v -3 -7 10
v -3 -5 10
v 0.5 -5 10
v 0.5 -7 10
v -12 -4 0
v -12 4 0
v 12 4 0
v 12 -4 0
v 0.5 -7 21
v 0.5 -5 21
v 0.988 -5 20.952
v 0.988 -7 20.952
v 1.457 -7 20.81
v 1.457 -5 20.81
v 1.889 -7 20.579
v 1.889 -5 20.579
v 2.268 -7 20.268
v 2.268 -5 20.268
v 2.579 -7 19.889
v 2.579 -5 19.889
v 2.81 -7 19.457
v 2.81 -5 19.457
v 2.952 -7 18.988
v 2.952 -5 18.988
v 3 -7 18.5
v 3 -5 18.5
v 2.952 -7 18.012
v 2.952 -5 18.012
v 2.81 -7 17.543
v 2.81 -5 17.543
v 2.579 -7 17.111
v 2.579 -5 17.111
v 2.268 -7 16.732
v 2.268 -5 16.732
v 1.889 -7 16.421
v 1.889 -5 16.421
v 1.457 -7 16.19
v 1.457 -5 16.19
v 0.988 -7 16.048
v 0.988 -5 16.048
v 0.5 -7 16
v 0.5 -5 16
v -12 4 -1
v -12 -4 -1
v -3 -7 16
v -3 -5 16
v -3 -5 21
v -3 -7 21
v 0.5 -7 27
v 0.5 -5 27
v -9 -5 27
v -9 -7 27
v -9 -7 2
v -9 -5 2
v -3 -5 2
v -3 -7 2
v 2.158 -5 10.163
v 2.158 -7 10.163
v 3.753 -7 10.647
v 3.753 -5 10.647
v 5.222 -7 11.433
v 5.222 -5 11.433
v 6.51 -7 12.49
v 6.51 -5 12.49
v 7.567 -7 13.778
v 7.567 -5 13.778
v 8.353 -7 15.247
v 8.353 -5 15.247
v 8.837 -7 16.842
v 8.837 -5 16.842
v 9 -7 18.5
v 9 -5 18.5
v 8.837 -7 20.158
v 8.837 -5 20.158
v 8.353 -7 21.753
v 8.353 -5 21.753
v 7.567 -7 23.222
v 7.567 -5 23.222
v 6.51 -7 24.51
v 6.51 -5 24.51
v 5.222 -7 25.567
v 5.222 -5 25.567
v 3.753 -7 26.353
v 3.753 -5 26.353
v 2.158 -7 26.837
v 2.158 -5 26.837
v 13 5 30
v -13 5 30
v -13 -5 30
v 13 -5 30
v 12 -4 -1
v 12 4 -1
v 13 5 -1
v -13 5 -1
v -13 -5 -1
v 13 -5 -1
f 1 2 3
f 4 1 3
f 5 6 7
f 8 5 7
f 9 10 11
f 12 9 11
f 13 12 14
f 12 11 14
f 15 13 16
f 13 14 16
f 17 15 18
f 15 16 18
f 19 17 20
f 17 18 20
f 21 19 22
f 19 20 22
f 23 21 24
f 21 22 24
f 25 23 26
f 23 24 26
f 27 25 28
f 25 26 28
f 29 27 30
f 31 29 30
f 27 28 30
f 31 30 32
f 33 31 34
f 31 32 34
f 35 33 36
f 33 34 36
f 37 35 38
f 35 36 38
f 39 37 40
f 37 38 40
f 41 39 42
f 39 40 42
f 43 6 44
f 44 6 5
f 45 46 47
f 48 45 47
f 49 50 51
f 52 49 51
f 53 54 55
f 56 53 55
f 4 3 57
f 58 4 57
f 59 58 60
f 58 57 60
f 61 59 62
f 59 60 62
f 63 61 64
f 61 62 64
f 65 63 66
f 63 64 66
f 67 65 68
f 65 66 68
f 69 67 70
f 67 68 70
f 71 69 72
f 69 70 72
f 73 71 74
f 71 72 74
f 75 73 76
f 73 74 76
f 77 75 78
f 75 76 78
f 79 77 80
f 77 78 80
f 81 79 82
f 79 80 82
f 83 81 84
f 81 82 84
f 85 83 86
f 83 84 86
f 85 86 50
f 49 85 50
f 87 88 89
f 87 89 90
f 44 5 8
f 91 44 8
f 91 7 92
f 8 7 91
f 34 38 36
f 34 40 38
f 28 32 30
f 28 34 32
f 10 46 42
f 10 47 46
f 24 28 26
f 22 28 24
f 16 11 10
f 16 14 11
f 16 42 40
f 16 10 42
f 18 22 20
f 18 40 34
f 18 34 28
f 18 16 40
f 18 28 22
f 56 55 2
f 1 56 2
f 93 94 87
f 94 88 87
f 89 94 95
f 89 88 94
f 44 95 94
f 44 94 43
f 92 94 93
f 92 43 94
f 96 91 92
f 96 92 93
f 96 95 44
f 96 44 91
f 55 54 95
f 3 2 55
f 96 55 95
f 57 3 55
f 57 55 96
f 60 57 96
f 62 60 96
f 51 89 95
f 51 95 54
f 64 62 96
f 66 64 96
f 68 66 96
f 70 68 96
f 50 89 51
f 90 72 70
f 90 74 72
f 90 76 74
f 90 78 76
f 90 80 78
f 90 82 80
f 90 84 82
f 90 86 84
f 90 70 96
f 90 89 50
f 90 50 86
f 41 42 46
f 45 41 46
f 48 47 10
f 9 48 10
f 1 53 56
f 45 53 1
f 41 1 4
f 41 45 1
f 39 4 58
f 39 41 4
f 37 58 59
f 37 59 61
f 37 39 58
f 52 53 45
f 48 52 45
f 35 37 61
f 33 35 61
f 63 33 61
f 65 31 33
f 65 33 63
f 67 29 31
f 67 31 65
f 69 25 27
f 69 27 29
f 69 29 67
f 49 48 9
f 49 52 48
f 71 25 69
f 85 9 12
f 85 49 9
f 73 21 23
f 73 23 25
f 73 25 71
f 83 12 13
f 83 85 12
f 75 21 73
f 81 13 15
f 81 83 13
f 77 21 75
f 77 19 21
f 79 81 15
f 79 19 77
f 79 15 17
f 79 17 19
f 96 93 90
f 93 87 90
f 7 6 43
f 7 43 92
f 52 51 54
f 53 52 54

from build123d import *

# Parameters (mm, degrees)
F0_W     = 26
F0_H     = 10
F1_DEPTH = 30
F2_W     = 26
F2_H     = 10
F2_W_2   = 24
F2_H_2   = 8
F3_DEPTH = 1
F5_DEPTH = 2


with BuildPart() as f1:
    # F0 (on Top) → F1 (new body)
    with BuildSketch(Plane.XY):
        Rectangle(F0_W, F0_H)
    extrude(amount=F1_DEPTH)

    # F2 (on face) → F3 (join)
    with BuildSketch(Plane(origin=(0, 0, 0), x_dir=(1, 0, 0), z_dir=(0, 0, -1))):
        Rectangle(F2_W, F2_H)
        Rectangle(F2_W_2, F2_H_2, mode=Mode.SUBTRACT)
    extrude(amount=F3_DEPTH)

    # F4 (on face) → F5 (join)
    with BuildSketch(Plane.XZ.offset(5)):
        with BuildLine():
            Line((-3, 27), (-9, 27))
            Line((-9, 27), (-9, 2))
            Line((-9, 2), (-3, 2))
            Line((-3, 2), (-3, 10))
            Line((-3, 10), (0.5, 10))
            ThreePointArc((0.5, 10), (9, 18.5), (0.5, 27))
            Line((0.5, 27), (-3, 27))
        make_face()
        with BuildLine():
            Line((-3, 16), (-3, 21))
            Line((-3, 21), (0.5, 21))
            ThreePointArc((0.5, 21), (3, 18.5), (0.5, 16))
            Line((0.5, 16), (-3, 16))
        make_face(mode=Mode.SUBTRACT)
    extrude(amount=F5_DEPTH)


solid = f1.part
